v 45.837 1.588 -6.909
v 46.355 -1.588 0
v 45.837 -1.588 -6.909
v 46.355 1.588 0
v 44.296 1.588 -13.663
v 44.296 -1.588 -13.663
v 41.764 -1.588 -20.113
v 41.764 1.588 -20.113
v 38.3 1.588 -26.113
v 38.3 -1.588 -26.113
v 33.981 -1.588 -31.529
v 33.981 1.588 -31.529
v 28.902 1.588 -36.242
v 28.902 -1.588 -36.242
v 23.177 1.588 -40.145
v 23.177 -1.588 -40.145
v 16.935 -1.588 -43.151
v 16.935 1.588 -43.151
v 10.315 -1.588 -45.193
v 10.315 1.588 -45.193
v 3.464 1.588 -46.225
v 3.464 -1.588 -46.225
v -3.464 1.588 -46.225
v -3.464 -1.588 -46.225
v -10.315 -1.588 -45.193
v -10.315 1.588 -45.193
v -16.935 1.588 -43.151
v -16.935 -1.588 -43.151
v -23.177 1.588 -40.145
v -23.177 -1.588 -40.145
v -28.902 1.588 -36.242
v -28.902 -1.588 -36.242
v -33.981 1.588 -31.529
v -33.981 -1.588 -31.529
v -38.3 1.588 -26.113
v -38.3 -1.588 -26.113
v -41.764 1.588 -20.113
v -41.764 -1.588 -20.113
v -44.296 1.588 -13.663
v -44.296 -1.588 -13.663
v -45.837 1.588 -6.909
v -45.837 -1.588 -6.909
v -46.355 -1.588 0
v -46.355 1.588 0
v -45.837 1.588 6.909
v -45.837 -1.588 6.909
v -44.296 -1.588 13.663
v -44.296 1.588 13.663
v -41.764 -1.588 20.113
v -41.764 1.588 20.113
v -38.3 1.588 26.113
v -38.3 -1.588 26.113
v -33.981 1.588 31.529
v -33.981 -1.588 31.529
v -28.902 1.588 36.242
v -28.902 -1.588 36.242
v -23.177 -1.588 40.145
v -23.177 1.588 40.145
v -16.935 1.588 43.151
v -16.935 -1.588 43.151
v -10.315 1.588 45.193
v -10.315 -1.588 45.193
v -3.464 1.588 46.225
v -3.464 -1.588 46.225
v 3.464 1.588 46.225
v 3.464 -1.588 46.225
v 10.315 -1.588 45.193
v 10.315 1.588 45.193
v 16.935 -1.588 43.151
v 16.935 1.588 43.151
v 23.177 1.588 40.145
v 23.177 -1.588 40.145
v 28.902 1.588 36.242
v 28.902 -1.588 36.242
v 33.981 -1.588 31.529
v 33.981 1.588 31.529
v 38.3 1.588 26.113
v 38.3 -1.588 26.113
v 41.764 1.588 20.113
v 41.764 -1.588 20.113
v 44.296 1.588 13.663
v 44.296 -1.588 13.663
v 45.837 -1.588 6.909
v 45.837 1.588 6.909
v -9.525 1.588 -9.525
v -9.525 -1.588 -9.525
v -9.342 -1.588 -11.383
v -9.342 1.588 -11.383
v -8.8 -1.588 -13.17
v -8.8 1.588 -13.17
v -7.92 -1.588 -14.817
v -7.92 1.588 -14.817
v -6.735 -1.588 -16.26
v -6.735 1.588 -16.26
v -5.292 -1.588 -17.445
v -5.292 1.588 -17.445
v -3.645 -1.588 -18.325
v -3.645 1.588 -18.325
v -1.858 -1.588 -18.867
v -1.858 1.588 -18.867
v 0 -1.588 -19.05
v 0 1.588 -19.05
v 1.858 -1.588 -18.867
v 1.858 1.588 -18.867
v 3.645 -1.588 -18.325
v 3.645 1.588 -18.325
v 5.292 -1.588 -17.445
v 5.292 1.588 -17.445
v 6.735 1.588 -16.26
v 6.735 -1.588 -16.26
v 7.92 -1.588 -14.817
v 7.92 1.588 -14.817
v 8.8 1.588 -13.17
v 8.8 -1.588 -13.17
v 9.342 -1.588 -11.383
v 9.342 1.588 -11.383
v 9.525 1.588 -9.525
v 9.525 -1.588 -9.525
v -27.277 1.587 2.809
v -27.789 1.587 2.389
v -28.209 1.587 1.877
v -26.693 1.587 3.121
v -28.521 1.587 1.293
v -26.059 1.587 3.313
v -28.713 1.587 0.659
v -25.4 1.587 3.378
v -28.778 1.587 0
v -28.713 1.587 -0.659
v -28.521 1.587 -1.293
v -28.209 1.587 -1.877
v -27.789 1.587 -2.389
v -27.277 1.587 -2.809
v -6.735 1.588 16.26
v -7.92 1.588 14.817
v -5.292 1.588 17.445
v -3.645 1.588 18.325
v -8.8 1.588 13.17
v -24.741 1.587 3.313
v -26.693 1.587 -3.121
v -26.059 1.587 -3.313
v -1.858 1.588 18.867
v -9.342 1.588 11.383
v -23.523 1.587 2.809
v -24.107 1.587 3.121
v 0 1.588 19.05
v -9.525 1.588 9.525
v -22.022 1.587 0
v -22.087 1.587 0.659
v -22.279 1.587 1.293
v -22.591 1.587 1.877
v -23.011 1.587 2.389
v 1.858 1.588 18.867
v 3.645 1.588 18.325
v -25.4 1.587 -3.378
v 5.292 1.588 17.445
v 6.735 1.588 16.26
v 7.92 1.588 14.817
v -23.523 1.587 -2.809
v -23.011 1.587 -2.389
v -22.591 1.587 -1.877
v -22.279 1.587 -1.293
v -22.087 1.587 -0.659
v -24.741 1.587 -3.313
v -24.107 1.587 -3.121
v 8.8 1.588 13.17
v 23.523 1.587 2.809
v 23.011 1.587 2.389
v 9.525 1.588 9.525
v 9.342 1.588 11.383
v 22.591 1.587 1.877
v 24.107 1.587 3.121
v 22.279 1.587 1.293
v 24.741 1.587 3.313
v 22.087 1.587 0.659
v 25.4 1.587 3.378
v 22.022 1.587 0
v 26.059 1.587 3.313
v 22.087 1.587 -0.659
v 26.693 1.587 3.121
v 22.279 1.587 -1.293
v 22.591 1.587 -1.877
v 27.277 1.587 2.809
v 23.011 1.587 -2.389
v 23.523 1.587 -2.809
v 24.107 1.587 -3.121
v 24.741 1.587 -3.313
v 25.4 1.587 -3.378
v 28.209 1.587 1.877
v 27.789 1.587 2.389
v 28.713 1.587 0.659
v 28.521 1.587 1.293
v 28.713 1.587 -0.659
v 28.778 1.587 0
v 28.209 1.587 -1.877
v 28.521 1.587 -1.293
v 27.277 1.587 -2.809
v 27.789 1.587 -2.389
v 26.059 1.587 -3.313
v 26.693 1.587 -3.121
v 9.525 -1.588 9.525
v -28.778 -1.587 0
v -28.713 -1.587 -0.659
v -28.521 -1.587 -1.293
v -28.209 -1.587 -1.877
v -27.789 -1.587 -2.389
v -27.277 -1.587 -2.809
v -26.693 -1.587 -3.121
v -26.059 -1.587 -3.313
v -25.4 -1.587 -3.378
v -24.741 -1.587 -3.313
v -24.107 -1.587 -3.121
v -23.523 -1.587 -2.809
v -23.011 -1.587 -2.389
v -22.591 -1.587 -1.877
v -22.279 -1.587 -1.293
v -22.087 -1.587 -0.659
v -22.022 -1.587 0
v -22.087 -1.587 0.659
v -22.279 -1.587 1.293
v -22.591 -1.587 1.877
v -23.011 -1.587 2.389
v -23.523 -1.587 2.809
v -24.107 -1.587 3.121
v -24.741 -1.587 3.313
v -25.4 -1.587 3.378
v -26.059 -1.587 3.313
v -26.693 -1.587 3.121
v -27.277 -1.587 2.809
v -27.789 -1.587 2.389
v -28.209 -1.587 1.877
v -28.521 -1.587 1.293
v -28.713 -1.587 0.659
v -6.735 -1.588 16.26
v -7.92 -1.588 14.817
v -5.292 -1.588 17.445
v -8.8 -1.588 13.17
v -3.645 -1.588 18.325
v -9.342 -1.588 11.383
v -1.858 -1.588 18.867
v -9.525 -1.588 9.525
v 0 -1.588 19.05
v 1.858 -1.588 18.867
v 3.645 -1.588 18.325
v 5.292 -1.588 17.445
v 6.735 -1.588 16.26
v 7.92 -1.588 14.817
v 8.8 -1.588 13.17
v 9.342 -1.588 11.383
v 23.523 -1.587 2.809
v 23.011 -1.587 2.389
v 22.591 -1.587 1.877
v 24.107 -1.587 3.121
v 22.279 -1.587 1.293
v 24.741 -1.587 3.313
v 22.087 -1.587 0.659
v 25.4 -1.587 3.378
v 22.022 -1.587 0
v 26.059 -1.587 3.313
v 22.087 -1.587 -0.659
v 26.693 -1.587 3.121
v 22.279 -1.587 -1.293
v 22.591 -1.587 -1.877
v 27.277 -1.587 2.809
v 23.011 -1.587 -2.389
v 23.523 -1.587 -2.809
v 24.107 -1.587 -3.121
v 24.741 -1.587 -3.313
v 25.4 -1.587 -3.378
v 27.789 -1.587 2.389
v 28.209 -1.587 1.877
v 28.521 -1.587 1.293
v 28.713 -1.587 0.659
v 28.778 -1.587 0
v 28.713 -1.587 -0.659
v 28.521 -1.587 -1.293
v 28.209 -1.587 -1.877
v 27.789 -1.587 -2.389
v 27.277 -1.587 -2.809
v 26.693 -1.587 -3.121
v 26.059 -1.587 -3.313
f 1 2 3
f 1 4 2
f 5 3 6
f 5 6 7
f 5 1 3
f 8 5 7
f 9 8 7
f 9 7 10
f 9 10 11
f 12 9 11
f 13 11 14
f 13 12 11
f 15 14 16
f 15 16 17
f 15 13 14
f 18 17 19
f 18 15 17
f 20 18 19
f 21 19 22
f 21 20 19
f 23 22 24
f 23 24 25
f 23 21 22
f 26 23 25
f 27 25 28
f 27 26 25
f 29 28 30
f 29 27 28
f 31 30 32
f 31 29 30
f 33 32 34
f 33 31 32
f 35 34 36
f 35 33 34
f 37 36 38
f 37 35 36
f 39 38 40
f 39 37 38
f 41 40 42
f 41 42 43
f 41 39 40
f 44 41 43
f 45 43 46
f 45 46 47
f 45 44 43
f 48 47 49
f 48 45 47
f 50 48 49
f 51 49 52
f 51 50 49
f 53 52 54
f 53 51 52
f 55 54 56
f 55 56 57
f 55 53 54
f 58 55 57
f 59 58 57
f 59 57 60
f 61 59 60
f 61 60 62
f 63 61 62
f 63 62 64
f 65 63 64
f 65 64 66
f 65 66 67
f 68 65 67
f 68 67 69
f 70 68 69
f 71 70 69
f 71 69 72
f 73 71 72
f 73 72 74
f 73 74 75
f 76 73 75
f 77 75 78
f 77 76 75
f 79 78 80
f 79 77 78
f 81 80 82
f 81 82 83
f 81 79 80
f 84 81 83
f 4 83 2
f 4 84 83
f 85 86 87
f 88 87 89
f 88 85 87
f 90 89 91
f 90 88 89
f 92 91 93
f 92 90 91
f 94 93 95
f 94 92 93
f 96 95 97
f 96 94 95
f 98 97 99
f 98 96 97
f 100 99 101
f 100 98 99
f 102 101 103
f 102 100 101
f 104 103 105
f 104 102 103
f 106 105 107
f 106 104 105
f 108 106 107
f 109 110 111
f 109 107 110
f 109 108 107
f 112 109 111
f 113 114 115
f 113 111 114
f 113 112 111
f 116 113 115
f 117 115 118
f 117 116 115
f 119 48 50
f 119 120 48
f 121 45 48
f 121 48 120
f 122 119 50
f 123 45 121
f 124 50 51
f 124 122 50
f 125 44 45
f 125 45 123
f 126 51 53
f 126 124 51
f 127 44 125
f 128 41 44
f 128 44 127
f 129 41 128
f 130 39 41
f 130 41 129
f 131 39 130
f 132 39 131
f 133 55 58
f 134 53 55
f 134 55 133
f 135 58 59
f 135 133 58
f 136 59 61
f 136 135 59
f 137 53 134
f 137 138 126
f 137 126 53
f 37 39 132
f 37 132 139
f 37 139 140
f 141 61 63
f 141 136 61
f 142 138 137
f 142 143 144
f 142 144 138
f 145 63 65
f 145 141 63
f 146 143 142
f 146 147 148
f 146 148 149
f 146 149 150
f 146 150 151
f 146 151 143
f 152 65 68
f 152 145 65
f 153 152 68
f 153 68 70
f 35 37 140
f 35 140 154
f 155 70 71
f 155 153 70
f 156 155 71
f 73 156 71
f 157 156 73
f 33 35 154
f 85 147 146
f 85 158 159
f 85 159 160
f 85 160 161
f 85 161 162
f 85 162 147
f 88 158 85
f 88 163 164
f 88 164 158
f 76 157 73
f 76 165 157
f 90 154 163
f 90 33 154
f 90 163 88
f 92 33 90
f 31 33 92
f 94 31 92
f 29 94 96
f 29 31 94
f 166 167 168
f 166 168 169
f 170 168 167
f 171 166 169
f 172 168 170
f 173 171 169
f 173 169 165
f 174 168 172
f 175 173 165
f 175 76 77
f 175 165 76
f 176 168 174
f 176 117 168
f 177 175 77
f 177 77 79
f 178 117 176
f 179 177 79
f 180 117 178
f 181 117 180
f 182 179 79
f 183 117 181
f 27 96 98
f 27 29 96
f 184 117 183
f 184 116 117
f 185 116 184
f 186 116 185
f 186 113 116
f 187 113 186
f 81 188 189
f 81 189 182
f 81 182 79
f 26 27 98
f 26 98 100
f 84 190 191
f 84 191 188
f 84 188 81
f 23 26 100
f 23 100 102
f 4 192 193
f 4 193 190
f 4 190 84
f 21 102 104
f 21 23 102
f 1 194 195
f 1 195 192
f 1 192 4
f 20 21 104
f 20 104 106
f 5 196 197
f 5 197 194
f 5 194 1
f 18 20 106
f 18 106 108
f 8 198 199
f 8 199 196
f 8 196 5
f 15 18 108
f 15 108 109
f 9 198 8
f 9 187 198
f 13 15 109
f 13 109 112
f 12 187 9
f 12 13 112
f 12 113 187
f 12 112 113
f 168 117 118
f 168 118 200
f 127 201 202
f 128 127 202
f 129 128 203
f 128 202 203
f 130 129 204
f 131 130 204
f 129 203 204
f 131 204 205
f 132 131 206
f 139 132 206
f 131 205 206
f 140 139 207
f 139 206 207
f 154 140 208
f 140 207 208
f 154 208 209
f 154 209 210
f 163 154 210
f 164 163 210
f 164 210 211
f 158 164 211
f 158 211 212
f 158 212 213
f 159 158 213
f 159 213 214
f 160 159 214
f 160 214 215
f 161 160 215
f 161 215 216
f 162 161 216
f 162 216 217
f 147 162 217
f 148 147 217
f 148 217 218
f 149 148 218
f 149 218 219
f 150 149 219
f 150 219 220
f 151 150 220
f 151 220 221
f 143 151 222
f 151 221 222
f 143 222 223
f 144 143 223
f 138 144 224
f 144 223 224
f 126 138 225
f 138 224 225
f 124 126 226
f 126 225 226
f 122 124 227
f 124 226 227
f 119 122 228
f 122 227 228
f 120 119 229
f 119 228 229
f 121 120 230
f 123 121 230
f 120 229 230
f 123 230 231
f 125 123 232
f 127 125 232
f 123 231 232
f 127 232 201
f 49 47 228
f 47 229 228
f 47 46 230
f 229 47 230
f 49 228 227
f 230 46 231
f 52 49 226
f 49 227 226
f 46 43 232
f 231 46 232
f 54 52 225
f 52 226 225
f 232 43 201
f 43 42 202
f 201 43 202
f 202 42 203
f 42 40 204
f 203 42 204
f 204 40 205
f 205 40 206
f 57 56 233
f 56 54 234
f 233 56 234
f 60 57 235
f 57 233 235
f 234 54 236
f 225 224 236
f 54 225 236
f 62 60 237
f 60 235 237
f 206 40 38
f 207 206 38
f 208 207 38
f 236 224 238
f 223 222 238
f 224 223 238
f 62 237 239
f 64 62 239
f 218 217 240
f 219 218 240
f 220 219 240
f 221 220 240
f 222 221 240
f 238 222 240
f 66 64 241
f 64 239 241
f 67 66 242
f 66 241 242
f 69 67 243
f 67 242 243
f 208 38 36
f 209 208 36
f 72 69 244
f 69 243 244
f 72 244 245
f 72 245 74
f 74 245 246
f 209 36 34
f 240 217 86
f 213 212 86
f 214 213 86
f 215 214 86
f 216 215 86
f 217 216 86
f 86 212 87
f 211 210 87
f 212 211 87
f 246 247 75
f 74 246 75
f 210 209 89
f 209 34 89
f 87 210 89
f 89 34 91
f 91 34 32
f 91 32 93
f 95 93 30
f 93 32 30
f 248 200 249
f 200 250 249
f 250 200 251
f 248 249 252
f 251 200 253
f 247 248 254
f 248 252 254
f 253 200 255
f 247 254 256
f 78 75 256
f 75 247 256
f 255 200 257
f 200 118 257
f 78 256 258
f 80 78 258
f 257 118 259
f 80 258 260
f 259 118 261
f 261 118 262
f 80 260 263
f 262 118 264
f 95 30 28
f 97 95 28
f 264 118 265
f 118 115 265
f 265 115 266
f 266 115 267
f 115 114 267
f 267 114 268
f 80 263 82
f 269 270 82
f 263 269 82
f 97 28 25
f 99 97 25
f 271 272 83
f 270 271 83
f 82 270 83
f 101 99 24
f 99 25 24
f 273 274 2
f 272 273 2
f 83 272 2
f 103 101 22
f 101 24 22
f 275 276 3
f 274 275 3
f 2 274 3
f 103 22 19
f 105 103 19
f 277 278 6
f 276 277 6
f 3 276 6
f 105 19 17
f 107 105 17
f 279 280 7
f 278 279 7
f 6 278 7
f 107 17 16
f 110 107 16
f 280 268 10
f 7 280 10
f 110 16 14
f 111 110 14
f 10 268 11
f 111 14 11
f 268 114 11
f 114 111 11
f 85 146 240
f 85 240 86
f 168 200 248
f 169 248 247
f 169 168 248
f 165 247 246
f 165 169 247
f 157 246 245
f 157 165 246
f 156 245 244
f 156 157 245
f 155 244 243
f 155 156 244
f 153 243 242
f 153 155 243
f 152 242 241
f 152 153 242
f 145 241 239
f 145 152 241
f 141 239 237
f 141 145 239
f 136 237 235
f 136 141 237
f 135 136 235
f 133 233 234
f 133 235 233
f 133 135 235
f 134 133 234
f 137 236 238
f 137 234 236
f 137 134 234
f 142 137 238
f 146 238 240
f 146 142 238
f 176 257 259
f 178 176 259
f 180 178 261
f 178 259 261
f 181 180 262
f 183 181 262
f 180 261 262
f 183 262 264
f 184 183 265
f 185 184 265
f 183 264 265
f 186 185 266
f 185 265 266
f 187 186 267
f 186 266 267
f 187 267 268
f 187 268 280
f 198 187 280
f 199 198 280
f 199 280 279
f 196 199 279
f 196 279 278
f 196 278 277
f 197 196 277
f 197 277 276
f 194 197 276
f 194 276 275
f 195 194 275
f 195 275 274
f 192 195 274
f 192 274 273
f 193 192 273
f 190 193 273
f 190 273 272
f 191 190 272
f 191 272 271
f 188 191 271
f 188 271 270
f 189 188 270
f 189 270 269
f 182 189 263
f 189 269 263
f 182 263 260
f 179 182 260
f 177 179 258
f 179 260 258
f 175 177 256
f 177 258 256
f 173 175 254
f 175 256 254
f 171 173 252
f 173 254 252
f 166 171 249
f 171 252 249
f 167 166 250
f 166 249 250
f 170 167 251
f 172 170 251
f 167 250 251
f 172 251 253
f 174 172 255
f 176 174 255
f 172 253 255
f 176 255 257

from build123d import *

# Parameters (mm, degrees)
SKETCH1_R                   = 46.355
BOSS_EXTRUDE1_DEPTH         = 1.5875
F_1_4_CLEARANCE_HOLE1_D     = 6.7564
F_1_4_CLEARANCE_HOLE1_DEPTH = 48.770172657
F_1_4_CLEARANCE_HOLE1_TIP   = 2.029827343
CUT_EXTRUDE1_DEPTH          = 4.175


with BuildPart() as part:
    # Sketch1 → Boss-Extrude1 (new body, symmetric)
    with BuildSketch(Plane(origin=(0, 0, 0), x_dir=(1, 0, 0), z_dir=(0, 1, 0))):
        Circle(SKETCH1_R)
    extrude(amount=BOSS_EXTRUDE1_DEPTH, both=True)

    # 1/4 Clearance Hole1
    with Locations(Plane(origin=(0, 1.5875, 0), x_dir=(1, 0, 0), z_dir=(0, 1, 0))):
        with Locations((25.4, 0), (-25.4, 0)):
            Hole(F_1_4_CLEARANCE_HOLE1_D / 2, depth=F_1_4_CLEARANCE_HOLE1_DEPTH)
            with Locations((0, 0, -(F_1_4_CLEARANCE_HOLE1_DEPTH + F_1_4_CLEARANCE_HOLE1_TIP / 2))):  # 118° drill point
                Cone(0, F_1_4_CLEARANCE_HOLE1_D / 2, F_1_4_CLEARANCE_HOLE1_TIP, mode=Mode.SUBTRACT)

    # Sketch4 → Cut-Extrude1 (cut, through all)
    with BuildSketch(Plane(origin=(0, 1.5875, 0), x_dir=(1, 0, 0), z_dir=(0, 1, 0))):
        with BuildLine():
            Line((9.525, 9.525), (9.525, -9.525))
            ThreePointArc((9.525, -9.525), (0, -19.05), (-9.525, -9.525))
            Line((-9.525, -9.525), (-9.525, 9.525))
            ThreePointArc((-9.525, 9.525), (0, 19.05), (9.525, 9.525))
        make_face()
    extrude(amount=-CUT_EXTRUDE1_DEPTH, mode=Mode.SUBTRACT)


solid = part.part
